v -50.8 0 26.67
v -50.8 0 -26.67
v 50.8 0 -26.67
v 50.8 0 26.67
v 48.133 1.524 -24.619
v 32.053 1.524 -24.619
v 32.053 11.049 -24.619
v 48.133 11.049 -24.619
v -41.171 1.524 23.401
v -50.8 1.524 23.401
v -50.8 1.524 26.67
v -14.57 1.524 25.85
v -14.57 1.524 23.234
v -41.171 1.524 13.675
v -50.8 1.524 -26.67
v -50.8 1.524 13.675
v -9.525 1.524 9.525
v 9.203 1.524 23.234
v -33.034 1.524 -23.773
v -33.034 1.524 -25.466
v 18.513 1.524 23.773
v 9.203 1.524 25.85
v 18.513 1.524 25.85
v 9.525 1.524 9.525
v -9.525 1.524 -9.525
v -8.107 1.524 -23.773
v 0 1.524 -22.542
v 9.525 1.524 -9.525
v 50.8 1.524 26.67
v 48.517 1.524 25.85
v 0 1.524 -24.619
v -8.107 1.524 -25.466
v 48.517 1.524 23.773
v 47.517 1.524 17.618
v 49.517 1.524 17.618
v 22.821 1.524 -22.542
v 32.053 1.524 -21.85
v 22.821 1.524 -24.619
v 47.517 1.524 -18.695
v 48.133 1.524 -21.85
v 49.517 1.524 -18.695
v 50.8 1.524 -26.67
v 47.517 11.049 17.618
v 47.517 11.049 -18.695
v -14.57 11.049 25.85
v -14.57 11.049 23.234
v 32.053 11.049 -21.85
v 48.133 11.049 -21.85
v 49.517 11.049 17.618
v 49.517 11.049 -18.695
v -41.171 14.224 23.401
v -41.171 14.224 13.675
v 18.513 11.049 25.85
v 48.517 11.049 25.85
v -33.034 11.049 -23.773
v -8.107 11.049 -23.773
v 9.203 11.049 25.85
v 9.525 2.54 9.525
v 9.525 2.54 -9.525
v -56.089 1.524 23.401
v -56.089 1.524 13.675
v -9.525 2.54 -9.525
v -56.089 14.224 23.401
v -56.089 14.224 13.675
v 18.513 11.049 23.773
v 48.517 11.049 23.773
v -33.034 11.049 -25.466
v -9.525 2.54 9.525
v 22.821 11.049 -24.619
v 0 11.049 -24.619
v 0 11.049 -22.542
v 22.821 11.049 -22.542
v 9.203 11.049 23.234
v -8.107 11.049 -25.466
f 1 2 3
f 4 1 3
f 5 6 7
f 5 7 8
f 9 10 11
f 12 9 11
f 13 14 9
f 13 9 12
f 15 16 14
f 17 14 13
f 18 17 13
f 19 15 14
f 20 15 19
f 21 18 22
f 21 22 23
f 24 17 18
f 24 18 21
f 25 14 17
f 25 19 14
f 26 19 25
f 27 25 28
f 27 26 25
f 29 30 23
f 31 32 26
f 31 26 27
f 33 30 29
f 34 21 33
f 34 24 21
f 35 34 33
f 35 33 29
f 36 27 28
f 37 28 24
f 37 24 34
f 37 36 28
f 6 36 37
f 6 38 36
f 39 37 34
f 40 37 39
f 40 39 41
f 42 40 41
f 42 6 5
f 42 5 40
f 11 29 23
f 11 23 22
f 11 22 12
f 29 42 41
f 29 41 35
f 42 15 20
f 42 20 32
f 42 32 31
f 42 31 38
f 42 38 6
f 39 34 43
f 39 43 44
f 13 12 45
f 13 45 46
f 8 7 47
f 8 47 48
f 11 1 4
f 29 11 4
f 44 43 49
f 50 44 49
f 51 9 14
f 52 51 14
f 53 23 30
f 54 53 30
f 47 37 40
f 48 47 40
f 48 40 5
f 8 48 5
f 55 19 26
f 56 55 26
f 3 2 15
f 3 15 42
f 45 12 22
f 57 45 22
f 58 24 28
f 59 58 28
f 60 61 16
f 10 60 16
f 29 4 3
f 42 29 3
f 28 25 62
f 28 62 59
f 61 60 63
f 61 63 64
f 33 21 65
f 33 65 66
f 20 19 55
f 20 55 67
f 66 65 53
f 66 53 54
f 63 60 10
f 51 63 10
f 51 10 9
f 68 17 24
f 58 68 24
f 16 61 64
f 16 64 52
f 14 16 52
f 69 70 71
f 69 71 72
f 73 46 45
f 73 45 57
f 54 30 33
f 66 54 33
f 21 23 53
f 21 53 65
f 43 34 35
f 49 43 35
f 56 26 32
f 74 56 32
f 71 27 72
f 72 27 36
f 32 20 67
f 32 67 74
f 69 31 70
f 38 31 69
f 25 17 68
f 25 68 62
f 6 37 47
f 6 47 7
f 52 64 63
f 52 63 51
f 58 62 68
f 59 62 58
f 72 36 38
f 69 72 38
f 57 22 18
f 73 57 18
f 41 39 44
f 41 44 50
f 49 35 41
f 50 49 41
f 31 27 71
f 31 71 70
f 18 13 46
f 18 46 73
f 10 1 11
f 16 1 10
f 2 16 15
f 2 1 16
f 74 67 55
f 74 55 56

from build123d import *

# Parameters (mm, degrees)
SKETCH1_W           = 101.6
SKETCH1_H           = 53.34
BOSS_EXTRUDE1_DEPTH = 1.524
SKETCH2_W           = 19.05
SKETCH2_H           = 19.05
BOSS_EXTRUDE2_DEPTH = 1.016
SKETCH3_W           = 14.918140665
SKETCH3_H           = 9.726042688
BOSS_EXTRUDE3_DEPTH = 12.7
SKETCH4_W           = 24.926999196
SKETCH4_H           = 1.692574019
SKETCH4_W_2         = 22.820903589
SKETCH4_H_2         = 2.077249933
SKETCH4_W_3         = 16.079453185
SKETCH4_H_3         = 2.769666577
SKETCH4_W_4         = 2.00031475
SKETCH4_H_4         = 36.313406236
SKETCH4_W_5         = 30.004721254
SKETCH4_W_6         = 23.772971456
SKETCH4_H_5         = 2.615796212
BOSS_EXTRUDE4_DEPTH = 9.525


with BuildPart() as part:
    # Sketch1 → Boss-Extrude1 (new body)
    with BuildSketch(Plane(origin=(0, 0, 0), x_dir=(1, 0, 0), z_dir=(0, 1, 0))):
        Rectangle(SKETCH1_W, SKETCH1_H)
    extrude(amount=BOSS_EXTRUDE1_DEPTH)

    # Sketch2 → Boss-Extrude2 (add)
    with BuildSketch(Plane(origin=(0, 1.524, 0), x_dir=(1, 0, 0), z_dir=(0, 1, 0))):
        Rectangle(SKETCH2_W, SKETCH2_H)
    extrude(amount=BOSS_EXTRUDE2_DEPTH)

    # Sketch3 → Boss-Extrude3 (add)
    with BuildSketch(Plane(origin=(0, 1.524, 0), x_dir=(1, 0, 0), z_dir=(0, 1, 0))):
        with Locations((-48.63021344, -18.537983619)):
            Rectangle(SKETCH3_W, SKETCH3_H)
    extrude(amount=BOSS_EXTRUDE3_DEPTH)

    # Sketch4 → Boss-Extrude4 (add)
    with BuildSketch(Plane(origin=(0, 1.524, 0), x_dir=(1, 0, 0), z_dir=(0, 1, 0))):
        with Locations((-20.570539456, 24.619258466)):
            Rectangle(SKETCH4_W, SKETCH4_H)
        with Locations((11.410451795, 23.580633498)):
            Rectangle(SKETCH4_W_2, SKETCH4_H_2)
        with Locations((40.092852107, 23.234425177)):
            Rectangle(SKETCH4_W_3, SKETCH4_H_3)
        with Locations((48.517254612, 0.538546279)):
            Rectangle(SKETCH4_W_4, SKETCH4_H_4)
        with Locations((33.514893985, -24.811596423)):
            Rectangle(SKETCH4_W_5, SKETCH4_H_2)
        with Locations((-2.683109477, -24.542323283)):
            Rectangle(SKETCH4_W_6, SKETCH4_H_5)
    extrude(amount=BOSS_EXTRUDE4_DEPTH)


solid = part.part
